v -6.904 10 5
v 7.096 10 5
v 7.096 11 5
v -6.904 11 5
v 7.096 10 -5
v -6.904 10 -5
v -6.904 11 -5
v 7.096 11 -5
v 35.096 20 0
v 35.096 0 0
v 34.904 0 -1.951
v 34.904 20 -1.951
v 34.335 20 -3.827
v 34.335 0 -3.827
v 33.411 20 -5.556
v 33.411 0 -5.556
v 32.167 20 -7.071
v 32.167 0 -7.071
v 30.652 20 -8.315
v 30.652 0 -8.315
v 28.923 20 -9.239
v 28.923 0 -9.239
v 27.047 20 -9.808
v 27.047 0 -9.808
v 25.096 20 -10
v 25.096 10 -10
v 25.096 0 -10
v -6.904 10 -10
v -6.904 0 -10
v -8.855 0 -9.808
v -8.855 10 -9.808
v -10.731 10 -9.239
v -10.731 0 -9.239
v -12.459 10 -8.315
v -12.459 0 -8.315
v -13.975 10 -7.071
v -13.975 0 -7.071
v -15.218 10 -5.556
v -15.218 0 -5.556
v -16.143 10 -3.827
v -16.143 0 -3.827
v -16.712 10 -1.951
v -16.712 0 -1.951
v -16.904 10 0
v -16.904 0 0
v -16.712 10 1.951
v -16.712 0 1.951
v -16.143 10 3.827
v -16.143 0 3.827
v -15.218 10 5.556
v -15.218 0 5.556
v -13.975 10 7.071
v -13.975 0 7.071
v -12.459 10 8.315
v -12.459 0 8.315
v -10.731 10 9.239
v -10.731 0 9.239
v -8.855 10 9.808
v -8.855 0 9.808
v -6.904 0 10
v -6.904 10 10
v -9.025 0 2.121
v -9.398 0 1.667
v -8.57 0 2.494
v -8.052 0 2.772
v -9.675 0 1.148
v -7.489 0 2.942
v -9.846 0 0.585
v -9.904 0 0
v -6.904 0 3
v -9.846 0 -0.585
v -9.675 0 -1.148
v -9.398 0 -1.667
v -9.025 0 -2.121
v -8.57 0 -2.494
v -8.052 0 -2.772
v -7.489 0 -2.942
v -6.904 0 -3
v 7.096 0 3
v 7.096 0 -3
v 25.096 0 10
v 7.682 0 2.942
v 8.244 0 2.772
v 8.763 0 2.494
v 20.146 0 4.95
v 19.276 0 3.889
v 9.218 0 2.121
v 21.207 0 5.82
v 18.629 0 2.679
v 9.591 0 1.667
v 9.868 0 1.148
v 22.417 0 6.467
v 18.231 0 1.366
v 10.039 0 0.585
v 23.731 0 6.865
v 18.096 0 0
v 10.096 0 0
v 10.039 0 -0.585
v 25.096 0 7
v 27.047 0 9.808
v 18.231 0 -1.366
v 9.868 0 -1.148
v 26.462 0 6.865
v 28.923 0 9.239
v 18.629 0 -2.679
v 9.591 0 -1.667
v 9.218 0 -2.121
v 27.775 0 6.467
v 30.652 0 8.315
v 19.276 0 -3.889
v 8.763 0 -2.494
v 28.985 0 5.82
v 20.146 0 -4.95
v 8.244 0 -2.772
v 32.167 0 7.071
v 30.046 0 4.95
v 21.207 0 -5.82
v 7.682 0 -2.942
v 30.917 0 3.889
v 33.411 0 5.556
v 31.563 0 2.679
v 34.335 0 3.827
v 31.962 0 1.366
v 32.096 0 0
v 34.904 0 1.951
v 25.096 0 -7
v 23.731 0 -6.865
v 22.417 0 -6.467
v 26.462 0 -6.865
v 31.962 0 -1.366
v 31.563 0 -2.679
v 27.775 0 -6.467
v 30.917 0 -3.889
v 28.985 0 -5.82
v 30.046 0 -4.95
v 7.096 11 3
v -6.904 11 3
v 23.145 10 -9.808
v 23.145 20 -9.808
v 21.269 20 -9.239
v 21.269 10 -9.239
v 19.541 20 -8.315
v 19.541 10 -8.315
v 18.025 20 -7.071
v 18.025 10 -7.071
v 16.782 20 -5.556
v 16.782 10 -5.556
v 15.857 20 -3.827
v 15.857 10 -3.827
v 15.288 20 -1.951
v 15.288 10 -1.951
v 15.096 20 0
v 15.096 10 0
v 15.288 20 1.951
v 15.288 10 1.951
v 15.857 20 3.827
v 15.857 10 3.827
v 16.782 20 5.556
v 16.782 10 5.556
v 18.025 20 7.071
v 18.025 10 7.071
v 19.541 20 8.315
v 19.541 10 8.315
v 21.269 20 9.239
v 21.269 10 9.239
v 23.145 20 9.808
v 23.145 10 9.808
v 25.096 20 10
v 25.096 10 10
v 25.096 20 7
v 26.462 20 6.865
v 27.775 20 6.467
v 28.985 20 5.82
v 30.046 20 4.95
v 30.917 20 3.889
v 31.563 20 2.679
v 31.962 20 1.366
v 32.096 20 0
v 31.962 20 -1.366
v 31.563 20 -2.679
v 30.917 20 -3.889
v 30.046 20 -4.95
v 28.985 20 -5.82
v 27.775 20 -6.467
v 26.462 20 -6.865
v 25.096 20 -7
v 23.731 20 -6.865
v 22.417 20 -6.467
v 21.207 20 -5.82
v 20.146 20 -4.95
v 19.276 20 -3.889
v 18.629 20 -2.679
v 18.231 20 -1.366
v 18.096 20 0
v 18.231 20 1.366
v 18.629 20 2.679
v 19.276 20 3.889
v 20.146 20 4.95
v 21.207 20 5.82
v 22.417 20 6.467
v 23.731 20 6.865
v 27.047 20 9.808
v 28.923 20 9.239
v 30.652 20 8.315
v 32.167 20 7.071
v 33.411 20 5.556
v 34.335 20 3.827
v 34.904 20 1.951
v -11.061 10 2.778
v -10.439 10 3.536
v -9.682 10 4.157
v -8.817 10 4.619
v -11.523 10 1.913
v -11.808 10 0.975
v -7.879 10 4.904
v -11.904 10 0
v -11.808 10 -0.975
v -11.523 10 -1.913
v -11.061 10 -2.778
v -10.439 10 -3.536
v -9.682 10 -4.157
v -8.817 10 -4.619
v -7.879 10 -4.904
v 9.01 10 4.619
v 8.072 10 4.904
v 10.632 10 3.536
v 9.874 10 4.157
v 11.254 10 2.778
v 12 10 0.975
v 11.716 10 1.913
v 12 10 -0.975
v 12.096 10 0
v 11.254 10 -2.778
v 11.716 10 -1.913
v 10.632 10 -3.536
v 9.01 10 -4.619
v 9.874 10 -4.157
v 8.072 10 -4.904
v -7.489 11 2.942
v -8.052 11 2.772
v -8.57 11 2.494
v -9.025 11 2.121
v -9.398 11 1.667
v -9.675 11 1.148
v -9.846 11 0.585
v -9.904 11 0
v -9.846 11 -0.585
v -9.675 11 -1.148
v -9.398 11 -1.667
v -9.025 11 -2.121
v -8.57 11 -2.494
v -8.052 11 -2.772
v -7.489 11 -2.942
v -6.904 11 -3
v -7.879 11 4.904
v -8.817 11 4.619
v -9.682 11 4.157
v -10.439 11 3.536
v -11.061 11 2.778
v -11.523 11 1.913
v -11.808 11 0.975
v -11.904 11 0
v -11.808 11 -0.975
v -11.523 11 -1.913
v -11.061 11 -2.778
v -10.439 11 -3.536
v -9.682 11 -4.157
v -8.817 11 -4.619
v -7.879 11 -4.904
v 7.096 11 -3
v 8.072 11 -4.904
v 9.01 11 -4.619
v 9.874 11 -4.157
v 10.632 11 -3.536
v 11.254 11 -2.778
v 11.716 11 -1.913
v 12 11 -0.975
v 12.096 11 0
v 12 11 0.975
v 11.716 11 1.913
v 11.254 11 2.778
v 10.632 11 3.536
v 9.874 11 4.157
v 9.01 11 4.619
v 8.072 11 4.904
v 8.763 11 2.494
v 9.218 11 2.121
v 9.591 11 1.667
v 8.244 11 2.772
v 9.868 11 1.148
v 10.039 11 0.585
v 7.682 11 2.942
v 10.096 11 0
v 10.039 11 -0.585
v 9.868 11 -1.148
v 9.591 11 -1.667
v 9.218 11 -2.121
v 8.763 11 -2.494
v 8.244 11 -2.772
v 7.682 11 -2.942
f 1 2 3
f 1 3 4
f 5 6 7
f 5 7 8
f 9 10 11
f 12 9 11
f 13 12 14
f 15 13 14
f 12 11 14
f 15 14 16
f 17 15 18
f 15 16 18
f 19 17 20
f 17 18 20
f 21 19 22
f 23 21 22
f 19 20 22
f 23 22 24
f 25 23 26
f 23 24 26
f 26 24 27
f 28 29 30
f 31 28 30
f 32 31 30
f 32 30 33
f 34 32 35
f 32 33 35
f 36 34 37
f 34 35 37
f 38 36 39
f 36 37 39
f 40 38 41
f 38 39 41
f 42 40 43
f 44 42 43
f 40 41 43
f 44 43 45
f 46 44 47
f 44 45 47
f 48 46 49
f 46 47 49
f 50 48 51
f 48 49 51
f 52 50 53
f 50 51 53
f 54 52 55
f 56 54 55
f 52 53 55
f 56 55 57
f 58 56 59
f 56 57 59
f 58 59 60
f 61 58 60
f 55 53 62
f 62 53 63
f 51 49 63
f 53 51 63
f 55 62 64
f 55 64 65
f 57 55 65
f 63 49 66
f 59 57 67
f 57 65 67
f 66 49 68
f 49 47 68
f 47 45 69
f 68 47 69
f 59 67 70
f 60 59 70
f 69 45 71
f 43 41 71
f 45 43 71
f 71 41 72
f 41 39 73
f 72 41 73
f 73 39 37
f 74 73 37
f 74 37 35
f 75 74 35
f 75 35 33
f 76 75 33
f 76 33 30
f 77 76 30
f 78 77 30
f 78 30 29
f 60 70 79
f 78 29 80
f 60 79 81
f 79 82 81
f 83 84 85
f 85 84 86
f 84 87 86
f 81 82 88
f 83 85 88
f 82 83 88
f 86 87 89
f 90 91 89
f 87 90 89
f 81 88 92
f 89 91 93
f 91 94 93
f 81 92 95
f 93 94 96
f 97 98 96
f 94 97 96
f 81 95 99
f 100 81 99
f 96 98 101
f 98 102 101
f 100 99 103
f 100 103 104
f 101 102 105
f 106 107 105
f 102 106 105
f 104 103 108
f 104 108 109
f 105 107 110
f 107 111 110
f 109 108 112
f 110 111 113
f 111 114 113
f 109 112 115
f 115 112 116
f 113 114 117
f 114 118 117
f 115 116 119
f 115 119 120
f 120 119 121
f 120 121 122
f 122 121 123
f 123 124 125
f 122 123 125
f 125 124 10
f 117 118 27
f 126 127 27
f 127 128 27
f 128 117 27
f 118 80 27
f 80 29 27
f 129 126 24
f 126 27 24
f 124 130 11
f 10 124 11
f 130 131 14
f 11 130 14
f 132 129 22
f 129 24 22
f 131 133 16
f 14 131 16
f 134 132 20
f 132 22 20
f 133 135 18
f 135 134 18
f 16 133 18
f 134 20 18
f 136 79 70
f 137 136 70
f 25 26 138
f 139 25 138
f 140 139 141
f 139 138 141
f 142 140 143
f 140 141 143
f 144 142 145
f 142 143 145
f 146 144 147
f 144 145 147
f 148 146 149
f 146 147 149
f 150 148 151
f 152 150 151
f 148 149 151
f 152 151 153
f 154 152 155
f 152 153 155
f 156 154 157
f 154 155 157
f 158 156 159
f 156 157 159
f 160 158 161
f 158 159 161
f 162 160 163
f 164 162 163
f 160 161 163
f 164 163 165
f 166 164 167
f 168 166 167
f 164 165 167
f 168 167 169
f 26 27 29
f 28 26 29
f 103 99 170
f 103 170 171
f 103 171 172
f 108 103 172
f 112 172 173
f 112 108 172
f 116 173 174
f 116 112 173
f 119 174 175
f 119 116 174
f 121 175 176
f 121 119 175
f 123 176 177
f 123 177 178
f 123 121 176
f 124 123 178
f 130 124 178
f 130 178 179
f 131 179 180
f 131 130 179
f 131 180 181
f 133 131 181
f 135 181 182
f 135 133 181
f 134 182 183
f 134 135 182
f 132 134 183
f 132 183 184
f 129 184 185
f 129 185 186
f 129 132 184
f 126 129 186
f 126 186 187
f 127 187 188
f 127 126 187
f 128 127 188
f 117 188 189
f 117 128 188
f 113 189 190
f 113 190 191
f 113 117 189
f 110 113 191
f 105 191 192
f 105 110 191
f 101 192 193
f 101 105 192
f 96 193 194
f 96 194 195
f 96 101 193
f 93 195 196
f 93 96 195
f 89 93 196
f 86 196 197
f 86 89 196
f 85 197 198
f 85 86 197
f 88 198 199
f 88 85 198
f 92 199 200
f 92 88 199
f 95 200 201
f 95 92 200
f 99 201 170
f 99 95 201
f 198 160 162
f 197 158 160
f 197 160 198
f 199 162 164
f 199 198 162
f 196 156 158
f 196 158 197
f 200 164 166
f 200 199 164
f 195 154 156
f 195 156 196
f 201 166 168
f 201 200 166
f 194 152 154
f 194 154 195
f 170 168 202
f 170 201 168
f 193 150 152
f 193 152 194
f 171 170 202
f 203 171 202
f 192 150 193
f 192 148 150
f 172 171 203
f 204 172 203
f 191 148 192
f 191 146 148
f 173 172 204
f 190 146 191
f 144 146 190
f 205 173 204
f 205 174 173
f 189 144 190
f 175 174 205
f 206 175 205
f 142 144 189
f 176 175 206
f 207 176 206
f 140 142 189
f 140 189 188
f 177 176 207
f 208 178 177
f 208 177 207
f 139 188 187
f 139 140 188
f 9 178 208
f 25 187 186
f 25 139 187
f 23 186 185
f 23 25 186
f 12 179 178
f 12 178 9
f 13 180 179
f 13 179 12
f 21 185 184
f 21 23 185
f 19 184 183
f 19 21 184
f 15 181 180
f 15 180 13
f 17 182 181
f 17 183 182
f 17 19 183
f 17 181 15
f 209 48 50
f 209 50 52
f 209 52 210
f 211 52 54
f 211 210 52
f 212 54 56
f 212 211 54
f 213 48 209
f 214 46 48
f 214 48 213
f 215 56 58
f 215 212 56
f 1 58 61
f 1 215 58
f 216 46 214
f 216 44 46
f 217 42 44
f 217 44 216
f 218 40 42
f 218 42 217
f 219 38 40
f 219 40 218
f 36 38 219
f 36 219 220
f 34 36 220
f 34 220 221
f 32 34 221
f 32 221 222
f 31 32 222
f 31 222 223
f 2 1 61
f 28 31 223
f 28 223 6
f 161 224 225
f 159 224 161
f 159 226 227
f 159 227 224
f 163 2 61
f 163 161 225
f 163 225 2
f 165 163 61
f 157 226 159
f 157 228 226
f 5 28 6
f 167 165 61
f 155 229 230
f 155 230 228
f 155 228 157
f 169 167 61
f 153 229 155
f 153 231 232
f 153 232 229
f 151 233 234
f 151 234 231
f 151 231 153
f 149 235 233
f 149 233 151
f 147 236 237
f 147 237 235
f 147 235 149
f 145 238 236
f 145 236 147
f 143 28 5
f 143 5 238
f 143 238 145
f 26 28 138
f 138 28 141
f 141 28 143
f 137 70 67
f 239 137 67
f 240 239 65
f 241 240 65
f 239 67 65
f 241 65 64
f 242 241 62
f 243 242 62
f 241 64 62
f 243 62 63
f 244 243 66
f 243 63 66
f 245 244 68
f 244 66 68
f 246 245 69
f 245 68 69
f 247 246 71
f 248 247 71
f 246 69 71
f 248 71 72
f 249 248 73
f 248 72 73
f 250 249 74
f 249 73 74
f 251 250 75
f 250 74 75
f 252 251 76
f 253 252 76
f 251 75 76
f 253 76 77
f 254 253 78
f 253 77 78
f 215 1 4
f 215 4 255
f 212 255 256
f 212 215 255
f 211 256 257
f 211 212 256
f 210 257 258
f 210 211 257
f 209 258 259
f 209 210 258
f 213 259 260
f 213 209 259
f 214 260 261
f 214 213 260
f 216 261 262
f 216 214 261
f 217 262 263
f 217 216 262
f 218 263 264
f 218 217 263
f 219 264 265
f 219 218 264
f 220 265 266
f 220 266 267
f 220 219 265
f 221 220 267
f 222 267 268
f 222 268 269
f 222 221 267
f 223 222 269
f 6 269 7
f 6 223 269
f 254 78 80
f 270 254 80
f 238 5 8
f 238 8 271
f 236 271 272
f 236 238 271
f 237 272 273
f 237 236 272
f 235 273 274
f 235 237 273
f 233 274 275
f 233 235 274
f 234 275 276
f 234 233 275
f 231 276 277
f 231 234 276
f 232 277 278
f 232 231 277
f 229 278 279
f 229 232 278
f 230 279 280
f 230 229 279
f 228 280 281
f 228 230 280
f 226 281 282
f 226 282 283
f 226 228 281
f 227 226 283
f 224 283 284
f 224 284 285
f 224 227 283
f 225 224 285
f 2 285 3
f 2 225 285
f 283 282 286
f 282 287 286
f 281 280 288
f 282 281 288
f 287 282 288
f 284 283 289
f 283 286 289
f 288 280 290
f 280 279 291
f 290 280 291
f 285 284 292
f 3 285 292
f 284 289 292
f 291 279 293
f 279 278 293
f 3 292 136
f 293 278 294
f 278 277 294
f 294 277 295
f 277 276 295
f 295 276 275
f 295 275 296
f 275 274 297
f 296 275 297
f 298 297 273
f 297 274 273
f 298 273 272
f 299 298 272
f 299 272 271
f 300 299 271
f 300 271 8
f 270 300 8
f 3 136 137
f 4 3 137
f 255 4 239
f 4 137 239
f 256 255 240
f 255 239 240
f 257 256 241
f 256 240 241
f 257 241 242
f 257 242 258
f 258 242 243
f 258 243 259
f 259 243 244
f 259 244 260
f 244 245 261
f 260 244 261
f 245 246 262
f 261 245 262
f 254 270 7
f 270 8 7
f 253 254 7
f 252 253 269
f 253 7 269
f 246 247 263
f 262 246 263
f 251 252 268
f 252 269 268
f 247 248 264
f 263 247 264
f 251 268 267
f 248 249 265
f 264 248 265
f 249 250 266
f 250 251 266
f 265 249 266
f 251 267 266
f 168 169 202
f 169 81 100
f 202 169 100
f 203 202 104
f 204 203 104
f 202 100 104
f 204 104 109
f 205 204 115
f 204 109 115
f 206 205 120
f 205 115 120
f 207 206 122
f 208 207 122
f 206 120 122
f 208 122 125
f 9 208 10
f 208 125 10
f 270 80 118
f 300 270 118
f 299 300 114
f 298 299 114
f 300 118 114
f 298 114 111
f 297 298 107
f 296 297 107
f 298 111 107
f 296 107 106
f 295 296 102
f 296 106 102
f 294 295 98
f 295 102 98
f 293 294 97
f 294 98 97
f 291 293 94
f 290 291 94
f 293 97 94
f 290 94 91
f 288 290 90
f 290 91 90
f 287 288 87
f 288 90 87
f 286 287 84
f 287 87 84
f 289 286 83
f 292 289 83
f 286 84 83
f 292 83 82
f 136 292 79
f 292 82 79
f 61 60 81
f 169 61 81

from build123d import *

# Parameters (mm, degrees)
EXTRUDE_1_DEPTH = 10
SKETCH_1_5_R    = 7
EXTRUDE_2_DEPTH = 20
EXTRUDE_3_DEPTH = 11


with BuildPart() as part:
    # 草图1 → 凸台-拉伸1 (new body)
    with BuildSketch(Plane(origin=(0, 0, 0), x_dir=(1, 0, 0), z_dir=(0, 1, 0))):
        with BuildLine():
            Line((25.09623431, 10), (-6.90376569, 10))
            ThreePointArc((-6.90376569, 10), (-16.90376569, 0), (-6.90376569, -10))
            Line((-6.90376569, -10), (25.09623431, -10))
            ThreePointArc((25.09623431, -10), (15.09623431, 0), (25.09623431, 10))
        make_face()
        with BuildLine():
            ThreePointArc((-6.90376569, -5), (-11.90376569, 0), (-6.90376569, 5))
            Line((-6.90376569, 5), (7.09623431, 5))
            ThreePointArc((7.09623431, 5), (12.09623431, 0), (7.09623431, -5))
            Line((7.09623431, -5), (-6.90376569, -5))
        make_face(mode=Mode.SUBTRACT)
    extrude(amount=EXTRUDE_1_DEPTH)

    # 草图1<5> → 凸台-拉伸2 (add)
    with BuildSketch(Plane(origin=(0, 0, 0), x_dir=(1, 0, 0), z_dir=(0, 1, 0))):
        with BuildLine():
            ThreePointArc((35.09623431, 0), (32.167302121, 7.071067812), (25.09623431, 10))
            ThreePointArc((25.09623431, 10), (15.09623431, 0), (25.09623431, -10))
            ThreePointArc((25.09623431, -10), (32.167302121, -7.071067812), (35.09623431, 0))
        make_face()
        with Locations((25.09623431, 0)):
            Circle(SKETCH_1_5_R, mode=Mode.SUBTRACT)
    extrude(amount=EXTRUDE_2_DEPTH)

    # 草图1<6> → 凸台-拉伸3 (add)
    with BuildSketch(Plane(origin=(0, 0, 0), x_dir=(1, 0, 0), z_dir=(0, 1, 0))):
        with BuildLine():
            Line((-6.90376569, 5), (7.09623431, 5))
            ThreePointArc((7.09623431, 5), (12.09623431, 0), (7.09623431, -5))
            Line((7.09623431, -5), (-6.90376569, -5))
            ThreePointArc((-6.90376569, -5), (-11.90376569, 0), (-6.90376569, 5))
        make_face()
        with BuildLine():
            Line((-6.90376569, 3), (7.09623431, 3))
            ThreePointArc((7.09623431, 3), (10.09623431, 0), (7.09623431, -3))
            Line((7.09623431, -3), (-6.90376569, -3))
            ThreePointArc((-6.90376569, -3), (-9.90376569, 0), (-6.90376569, 3))
        make_face(mode=Mode.SUBTRACT)
    extrude(amount=EXTRUDE_3_DEPTH)


solid = part.part
